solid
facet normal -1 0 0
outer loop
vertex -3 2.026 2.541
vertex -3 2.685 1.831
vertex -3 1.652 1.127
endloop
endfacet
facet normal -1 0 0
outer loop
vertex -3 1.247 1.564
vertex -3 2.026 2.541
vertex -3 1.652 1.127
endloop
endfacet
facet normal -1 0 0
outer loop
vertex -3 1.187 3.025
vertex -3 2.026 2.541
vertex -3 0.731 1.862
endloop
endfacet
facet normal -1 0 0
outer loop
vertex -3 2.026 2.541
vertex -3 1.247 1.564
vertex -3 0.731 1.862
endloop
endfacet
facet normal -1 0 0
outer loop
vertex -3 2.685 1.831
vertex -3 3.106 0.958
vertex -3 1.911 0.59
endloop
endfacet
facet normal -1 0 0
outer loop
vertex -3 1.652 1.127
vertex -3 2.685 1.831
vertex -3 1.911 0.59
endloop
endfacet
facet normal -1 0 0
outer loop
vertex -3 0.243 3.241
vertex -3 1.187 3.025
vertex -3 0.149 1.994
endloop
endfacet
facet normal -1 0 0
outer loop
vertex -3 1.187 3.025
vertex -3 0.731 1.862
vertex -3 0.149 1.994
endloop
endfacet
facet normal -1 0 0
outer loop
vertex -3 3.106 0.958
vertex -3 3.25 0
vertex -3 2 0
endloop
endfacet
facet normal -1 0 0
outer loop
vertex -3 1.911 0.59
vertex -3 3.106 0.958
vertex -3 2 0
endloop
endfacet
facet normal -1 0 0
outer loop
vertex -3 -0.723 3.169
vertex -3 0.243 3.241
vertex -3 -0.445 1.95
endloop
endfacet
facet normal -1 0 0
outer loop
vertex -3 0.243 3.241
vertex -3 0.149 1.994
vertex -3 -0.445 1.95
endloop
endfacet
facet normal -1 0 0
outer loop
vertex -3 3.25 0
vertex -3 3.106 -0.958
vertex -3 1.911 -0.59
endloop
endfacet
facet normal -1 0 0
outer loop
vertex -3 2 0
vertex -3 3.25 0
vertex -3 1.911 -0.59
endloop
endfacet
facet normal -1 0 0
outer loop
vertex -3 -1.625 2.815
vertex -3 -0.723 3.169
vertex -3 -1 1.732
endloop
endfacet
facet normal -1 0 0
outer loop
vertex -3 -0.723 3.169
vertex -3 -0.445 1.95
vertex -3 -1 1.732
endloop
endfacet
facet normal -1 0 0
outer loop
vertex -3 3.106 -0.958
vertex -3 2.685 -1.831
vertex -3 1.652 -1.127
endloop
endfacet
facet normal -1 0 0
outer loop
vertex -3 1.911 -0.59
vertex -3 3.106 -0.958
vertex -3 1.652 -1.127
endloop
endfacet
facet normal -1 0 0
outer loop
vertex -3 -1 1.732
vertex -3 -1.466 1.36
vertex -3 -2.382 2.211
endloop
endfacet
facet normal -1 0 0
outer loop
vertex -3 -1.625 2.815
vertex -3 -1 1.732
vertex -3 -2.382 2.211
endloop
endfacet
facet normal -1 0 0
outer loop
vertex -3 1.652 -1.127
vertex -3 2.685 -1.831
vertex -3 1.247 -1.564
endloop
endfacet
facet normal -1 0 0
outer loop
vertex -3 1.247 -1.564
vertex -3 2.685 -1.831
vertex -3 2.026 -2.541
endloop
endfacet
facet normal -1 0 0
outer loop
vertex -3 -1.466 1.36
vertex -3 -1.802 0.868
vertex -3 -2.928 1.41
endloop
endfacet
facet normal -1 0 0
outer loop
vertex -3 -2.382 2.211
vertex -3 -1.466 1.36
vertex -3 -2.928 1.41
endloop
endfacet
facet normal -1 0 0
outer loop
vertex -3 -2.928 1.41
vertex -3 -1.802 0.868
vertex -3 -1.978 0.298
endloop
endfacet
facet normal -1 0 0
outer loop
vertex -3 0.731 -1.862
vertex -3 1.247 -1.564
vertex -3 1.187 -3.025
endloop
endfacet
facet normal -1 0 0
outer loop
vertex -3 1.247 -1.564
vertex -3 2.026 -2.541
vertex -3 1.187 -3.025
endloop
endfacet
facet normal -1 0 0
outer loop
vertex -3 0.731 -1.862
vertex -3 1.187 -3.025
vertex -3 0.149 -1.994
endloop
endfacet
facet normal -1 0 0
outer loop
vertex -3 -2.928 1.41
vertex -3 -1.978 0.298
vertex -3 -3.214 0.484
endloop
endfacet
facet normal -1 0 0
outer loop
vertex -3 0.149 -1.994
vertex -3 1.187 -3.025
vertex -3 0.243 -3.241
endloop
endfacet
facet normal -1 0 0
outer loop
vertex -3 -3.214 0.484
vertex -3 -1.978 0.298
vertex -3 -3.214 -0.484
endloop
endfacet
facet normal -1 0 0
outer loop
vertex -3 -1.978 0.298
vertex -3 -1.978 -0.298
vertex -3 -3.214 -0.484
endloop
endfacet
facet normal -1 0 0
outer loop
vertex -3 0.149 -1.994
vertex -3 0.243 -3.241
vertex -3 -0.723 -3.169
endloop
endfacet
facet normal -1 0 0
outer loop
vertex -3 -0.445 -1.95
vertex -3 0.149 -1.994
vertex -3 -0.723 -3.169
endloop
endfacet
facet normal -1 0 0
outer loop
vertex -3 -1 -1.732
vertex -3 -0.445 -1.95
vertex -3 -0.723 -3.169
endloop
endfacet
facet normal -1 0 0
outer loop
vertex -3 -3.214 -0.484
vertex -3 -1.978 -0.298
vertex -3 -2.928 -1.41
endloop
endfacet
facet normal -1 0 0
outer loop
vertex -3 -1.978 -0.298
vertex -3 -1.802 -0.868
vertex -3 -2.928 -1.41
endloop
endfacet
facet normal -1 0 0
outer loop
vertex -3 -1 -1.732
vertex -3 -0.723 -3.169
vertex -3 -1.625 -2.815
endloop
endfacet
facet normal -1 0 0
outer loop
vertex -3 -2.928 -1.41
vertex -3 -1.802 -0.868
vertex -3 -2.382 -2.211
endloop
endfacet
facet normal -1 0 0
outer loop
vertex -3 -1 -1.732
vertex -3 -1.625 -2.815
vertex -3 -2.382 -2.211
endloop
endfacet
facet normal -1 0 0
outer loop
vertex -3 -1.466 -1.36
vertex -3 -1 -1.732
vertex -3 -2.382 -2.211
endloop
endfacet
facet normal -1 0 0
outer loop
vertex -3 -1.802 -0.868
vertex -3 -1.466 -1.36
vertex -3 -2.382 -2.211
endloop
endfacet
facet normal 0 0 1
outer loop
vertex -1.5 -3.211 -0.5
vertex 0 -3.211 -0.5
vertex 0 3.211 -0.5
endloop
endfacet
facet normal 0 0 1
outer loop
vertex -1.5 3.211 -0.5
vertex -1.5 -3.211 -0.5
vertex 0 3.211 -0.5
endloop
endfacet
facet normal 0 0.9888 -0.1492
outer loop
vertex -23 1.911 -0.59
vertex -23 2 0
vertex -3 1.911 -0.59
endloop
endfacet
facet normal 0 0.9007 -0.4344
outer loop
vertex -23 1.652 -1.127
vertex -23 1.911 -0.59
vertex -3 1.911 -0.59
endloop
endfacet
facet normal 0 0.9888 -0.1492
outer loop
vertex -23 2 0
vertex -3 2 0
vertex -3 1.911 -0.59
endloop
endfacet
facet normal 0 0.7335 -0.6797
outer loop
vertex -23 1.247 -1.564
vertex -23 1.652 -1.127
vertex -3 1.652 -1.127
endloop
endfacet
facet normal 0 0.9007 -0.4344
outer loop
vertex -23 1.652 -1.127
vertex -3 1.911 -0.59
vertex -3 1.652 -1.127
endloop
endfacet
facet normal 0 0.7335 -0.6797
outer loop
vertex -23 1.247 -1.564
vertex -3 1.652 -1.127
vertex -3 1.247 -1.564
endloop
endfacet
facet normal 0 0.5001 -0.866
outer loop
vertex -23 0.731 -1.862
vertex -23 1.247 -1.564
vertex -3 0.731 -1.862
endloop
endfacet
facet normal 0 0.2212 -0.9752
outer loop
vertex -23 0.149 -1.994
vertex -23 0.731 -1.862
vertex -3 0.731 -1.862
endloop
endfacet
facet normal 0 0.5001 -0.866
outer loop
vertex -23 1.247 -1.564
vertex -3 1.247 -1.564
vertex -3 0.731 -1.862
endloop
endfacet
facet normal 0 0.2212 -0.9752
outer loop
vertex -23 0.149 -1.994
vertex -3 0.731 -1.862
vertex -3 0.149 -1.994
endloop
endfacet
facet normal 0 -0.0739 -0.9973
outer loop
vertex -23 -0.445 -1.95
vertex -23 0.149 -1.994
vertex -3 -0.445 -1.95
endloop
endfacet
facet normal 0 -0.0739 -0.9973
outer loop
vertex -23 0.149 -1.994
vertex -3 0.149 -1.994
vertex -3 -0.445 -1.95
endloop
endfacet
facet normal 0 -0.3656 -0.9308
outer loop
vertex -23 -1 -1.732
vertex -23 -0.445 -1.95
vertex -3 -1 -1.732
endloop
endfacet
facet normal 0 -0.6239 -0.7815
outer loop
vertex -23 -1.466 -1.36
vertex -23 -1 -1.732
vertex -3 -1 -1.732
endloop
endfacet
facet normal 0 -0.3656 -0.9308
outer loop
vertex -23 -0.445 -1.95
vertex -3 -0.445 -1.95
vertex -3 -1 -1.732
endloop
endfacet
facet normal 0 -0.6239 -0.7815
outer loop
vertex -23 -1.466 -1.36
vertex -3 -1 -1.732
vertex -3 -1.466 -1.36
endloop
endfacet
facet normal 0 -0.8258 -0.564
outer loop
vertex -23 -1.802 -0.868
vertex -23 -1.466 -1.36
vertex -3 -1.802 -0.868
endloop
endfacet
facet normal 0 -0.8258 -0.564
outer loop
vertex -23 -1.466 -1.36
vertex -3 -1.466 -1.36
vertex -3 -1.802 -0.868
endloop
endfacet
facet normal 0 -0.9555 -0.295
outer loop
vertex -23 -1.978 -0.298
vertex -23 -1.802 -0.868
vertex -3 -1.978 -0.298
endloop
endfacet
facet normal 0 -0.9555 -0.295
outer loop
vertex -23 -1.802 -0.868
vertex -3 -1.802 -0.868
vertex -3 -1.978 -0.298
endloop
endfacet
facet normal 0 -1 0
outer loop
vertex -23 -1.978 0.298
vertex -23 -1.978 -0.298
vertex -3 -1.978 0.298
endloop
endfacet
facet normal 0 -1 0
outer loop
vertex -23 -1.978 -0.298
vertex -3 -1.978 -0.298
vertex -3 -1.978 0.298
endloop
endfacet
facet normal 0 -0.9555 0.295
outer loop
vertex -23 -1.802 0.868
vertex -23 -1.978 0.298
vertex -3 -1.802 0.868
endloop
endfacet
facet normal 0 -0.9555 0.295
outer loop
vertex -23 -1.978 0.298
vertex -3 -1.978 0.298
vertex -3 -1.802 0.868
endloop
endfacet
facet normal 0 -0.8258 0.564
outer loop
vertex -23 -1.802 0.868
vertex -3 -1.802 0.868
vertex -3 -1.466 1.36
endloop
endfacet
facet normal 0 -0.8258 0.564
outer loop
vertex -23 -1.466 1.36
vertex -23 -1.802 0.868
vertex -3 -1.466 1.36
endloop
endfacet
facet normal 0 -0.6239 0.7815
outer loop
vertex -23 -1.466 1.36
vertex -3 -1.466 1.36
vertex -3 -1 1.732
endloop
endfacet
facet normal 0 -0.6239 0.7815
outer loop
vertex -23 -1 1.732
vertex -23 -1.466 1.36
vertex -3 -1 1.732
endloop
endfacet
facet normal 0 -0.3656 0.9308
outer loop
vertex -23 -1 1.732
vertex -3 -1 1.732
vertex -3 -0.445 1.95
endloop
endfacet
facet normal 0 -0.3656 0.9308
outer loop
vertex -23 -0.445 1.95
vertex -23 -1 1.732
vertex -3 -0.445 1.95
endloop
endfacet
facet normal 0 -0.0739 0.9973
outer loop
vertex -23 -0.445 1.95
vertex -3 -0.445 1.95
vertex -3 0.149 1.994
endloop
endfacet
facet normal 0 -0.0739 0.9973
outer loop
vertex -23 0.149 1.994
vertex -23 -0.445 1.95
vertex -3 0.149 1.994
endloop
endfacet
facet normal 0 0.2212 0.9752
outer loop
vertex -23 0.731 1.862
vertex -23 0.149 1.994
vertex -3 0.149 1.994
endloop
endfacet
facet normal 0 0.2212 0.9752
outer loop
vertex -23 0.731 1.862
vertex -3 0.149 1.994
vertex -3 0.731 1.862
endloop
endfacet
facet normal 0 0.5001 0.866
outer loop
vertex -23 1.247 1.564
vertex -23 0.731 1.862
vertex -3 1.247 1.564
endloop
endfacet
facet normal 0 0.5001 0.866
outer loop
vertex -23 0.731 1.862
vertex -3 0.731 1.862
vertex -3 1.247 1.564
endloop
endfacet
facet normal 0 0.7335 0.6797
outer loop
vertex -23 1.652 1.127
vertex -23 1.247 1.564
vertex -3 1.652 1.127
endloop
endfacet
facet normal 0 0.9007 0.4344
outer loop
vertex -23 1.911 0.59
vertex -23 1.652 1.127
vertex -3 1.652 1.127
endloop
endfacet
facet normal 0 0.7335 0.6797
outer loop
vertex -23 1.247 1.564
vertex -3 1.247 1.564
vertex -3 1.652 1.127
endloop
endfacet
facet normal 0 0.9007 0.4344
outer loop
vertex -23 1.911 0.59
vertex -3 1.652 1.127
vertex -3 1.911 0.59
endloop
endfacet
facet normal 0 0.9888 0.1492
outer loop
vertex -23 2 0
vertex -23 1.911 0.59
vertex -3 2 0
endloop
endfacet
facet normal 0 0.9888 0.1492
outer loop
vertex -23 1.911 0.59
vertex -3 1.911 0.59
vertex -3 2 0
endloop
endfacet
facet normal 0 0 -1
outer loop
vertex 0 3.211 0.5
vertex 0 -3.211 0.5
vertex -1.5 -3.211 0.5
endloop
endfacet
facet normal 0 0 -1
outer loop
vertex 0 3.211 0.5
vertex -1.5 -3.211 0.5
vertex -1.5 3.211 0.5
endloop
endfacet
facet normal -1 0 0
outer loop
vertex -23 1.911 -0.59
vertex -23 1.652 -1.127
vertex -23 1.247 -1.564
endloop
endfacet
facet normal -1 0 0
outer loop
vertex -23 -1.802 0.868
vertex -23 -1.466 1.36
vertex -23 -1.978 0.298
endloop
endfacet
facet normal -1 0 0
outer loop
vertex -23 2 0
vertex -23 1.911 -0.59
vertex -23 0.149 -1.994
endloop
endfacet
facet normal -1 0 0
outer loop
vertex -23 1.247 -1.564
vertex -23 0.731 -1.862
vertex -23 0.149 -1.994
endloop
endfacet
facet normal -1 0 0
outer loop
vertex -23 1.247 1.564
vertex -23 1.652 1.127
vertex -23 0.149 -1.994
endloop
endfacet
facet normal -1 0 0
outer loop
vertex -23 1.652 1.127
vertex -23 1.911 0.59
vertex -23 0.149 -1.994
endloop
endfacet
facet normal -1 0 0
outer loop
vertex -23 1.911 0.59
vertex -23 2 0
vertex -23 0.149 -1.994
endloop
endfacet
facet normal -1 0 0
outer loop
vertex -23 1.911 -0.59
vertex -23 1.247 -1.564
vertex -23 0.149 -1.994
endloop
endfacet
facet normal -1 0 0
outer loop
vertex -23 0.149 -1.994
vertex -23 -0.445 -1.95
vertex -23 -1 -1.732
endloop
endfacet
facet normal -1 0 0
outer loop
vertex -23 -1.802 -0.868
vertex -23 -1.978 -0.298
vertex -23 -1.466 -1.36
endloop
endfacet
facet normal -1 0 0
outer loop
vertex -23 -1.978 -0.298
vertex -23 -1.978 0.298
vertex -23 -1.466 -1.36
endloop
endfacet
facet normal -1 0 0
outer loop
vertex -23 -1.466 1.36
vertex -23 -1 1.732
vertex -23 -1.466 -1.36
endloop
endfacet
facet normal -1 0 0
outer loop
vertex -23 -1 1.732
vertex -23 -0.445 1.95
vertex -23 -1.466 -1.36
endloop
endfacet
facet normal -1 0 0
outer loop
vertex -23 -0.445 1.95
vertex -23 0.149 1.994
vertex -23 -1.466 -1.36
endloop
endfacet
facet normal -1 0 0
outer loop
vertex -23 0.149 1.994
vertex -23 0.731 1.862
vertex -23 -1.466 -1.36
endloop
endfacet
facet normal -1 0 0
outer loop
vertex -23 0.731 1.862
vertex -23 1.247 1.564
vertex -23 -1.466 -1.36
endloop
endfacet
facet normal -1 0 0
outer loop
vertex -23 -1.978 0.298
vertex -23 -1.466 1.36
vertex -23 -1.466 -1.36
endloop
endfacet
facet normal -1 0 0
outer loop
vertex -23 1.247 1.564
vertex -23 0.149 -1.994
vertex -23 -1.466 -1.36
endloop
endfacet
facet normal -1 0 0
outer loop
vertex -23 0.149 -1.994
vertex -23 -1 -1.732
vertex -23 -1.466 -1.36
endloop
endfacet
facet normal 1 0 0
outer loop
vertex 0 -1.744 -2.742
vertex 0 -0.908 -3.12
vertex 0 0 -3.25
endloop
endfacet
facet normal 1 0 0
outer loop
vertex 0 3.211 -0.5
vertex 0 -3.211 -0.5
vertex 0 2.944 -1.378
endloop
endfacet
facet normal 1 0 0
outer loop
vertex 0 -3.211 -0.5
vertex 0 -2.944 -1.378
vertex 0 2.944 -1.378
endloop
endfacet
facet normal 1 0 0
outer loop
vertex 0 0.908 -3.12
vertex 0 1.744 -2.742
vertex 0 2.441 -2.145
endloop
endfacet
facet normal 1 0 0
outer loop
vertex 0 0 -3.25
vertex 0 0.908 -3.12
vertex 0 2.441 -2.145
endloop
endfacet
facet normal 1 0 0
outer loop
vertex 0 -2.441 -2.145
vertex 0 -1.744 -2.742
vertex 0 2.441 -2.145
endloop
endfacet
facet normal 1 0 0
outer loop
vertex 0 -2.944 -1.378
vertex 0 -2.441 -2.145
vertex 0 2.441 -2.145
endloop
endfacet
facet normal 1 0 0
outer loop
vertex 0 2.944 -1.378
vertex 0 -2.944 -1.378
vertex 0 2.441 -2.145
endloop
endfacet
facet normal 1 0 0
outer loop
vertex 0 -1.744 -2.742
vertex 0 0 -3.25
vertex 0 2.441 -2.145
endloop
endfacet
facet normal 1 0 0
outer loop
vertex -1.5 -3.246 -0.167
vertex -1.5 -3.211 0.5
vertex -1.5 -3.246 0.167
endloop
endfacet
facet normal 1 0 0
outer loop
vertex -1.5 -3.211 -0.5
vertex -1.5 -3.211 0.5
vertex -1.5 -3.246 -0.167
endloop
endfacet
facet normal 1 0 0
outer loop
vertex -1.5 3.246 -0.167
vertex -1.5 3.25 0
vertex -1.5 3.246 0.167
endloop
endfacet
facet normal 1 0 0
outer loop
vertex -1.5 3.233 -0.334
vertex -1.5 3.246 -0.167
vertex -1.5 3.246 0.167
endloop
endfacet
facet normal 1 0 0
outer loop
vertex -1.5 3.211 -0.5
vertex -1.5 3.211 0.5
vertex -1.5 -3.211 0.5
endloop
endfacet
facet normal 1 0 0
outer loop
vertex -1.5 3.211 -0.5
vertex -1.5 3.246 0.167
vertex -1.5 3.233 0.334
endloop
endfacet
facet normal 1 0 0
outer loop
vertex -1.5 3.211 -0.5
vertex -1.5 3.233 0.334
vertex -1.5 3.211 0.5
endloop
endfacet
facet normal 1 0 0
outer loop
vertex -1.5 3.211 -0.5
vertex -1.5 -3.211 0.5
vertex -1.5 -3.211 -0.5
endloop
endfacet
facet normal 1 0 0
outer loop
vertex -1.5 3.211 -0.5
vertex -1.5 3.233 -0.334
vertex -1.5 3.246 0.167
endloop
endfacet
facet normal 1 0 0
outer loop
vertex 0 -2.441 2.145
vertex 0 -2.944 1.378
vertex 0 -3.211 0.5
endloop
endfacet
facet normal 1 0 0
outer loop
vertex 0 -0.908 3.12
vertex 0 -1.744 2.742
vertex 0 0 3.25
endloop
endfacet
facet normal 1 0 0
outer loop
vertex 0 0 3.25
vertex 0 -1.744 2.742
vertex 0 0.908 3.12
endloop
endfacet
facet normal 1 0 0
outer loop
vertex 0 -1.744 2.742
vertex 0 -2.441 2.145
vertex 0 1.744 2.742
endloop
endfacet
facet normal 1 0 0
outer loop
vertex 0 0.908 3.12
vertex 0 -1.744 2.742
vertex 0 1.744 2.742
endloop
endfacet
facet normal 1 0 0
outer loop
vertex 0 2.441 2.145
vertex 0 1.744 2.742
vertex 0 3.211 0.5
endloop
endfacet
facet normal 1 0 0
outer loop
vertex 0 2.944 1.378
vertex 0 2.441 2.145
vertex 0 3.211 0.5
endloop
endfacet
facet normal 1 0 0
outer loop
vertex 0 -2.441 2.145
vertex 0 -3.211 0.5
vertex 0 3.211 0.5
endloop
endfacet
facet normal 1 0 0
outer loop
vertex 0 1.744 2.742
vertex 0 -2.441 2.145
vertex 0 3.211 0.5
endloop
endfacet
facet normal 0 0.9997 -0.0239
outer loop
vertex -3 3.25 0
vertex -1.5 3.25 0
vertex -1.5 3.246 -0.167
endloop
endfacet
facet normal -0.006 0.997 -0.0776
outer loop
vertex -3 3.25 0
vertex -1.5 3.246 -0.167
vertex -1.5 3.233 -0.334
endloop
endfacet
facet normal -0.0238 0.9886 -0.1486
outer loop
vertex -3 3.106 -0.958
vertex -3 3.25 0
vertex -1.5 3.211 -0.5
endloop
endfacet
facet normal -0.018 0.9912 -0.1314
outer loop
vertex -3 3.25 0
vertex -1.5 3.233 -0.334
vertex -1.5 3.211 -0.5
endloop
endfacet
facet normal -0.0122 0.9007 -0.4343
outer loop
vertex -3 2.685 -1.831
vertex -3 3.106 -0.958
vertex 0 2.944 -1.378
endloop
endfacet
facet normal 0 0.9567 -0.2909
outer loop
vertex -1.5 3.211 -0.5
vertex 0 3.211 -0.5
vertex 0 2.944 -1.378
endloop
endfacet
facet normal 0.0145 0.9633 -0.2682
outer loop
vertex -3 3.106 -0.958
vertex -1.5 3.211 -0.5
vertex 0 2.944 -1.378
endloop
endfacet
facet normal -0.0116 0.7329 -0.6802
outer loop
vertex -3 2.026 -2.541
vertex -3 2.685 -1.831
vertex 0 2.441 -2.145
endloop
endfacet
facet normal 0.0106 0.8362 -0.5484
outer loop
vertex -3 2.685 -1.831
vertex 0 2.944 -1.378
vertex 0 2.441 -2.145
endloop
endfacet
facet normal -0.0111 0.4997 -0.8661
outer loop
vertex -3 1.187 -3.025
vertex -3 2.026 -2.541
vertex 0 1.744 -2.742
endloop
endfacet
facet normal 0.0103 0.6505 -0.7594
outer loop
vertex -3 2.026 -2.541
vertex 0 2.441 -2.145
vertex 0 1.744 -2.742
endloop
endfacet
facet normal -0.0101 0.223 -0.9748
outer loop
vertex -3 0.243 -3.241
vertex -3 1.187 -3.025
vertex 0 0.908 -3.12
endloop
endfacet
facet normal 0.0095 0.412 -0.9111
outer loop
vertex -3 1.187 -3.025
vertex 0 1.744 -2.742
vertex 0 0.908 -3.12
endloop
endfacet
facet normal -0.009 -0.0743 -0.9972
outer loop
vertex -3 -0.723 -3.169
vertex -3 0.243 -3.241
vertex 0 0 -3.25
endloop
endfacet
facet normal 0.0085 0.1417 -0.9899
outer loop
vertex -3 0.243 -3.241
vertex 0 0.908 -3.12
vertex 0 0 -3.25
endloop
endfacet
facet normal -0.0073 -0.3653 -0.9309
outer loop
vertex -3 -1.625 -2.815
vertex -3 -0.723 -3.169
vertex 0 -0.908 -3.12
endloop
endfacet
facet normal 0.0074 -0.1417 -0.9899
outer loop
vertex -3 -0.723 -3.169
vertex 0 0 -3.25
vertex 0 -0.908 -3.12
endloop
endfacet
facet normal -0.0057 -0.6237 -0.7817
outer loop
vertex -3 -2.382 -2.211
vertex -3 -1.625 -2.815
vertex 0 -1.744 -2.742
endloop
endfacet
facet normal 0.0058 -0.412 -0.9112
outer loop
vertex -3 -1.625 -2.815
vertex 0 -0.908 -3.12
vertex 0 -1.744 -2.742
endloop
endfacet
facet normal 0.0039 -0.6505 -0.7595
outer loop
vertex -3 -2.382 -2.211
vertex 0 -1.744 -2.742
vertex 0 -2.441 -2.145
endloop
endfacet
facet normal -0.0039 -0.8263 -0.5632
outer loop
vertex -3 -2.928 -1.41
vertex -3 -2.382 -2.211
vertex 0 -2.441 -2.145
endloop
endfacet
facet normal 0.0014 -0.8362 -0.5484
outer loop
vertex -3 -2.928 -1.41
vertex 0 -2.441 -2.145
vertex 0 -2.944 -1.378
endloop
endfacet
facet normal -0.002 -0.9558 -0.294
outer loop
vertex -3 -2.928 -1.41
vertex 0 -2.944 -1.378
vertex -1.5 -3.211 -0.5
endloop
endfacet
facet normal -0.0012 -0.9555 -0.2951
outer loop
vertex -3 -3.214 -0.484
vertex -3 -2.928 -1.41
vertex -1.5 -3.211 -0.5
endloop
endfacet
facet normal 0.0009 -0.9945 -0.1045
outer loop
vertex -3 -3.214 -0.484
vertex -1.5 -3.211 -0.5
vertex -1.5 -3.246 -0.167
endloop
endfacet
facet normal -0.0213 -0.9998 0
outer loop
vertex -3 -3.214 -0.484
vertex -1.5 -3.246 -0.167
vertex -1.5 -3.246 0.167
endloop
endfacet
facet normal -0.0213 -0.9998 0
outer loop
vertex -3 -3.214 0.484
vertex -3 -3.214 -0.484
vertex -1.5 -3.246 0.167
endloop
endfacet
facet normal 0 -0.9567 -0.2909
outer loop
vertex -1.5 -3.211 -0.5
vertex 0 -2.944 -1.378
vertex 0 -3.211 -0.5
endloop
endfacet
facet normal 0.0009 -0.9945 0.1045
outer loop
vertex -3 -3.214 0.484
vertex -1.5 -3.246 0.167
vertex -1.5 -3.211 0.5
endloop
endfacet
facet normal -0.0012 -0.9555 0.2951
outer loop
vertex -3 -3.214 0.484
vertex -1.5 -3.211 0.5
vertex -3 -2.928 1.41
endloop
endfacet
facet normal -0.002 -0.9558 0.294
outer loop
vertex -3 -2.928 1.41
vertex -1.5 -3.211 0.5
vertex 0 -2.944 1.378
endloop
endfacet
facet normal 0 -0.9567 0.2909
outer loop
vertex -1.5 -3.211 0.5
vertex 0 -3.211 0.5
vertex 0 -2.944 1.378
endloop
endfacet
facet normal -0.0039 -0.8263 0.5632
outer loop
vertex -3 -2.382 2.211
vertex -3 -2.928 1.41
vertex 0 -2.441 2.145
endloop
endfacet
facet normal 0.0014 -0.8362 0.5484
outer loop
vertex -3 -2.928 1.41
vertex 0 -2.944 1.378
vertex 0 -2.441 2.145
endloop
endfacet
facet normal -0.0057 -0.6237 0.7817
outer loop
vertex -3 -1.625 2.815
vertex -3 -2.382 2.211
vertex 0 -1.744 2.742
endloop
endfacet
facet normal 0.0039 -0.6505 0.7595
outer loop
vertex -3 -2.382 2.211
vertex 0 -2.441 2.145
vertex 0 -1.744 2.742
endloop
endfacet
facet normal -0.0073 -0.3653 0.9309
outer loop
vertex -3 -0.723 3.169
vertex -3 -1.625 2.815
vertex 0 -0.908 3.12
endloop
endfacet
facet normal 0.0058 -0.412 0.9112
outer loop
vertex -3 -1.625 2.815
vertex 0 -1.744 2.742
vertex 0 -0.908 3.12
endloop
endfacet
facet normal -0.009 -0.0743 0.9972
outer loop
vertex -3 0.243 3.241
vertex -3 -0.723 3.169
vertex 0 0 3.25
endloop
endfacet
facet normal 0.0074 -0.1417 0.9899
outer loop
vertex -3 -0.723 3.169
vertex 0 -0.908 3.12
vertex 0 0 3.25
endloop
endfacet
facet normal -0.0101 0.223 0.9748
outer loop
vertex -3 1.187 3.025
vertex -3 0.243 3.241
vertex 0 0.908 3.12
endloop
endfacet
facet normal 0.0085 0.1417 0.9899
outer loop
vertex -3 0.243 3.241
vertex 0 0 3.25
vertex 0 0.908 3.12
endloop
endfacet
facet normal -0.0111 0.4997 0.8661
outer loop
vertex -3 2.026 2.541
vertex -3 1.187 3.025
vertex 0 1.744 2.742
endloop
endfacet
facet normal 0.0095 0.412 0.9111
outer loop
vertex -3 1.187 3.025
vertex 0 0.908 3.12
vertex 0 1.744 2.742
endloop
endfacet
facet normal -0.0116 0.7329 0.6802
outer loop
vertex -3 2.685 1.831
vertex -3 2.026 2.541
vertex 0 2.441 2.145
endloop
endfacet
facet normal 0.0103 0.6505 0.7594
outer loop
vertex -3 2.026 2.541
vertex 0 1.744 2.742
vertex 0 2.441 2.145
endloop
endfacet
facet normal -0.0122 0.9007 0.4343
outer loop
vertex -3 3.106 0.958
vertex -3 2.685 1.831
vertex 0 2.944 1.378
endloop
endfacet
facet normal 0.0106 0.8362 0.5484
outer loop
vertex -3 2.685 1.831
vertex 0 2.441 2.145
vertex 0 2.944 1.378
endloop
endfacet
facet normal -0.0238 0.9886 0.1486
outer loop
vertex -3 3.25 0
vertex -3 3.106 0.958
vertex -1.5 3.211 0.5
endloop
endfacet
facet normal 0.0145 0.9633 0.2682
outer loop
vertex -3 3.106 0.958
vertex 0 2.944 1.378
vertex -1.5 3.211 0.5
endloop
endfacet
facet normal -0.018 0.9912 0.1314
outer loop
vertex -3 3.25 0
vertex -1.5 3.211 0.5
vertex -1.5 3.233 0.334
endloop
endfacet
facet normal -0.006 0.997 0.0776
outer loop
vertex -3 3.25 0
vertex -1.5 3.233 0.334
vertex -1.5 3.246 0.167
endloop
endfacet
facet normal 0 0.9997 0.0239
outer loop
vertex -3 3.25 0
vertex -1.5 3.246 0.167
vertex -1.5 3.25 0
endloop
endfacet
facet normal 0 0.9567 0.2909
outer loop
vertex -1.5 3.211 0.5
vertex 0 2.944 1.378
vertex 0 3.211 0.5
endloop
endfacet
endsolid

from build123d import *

# Parameters (mm, degrees)
SKETCH2_W          = 1
SKETCH2_H          = 6.5
CUT_EXTRUDE1_DEPTH = 1.5


with BuildPart() as part:
    # Sketch1 → Revolve1 (revolve)
    with BuildSketch(Plane.XY):
        Polygon((0, 0), (-23, 0), (-23, 2), (-3, 2), (-3, 3.25), (0, 3.25), align=None)
    revolve(axis=Axis((0, 0, 0), (-1, 0, 0)))

    # Sketch2 → Cut-Extrude1 (cut)
    with BuildSketch(Plane(origin=(0, 0, 0), x_dir=(0, 0, -1), z_dir=(1, 0, 0))):
        Rectangle(SKETCH2_W, SKETCH2_H)
    extrude(amount=-CUT_EXTRUDE1_DEPTH, mode=Mode.SUBTRACT)


solid = part.part
